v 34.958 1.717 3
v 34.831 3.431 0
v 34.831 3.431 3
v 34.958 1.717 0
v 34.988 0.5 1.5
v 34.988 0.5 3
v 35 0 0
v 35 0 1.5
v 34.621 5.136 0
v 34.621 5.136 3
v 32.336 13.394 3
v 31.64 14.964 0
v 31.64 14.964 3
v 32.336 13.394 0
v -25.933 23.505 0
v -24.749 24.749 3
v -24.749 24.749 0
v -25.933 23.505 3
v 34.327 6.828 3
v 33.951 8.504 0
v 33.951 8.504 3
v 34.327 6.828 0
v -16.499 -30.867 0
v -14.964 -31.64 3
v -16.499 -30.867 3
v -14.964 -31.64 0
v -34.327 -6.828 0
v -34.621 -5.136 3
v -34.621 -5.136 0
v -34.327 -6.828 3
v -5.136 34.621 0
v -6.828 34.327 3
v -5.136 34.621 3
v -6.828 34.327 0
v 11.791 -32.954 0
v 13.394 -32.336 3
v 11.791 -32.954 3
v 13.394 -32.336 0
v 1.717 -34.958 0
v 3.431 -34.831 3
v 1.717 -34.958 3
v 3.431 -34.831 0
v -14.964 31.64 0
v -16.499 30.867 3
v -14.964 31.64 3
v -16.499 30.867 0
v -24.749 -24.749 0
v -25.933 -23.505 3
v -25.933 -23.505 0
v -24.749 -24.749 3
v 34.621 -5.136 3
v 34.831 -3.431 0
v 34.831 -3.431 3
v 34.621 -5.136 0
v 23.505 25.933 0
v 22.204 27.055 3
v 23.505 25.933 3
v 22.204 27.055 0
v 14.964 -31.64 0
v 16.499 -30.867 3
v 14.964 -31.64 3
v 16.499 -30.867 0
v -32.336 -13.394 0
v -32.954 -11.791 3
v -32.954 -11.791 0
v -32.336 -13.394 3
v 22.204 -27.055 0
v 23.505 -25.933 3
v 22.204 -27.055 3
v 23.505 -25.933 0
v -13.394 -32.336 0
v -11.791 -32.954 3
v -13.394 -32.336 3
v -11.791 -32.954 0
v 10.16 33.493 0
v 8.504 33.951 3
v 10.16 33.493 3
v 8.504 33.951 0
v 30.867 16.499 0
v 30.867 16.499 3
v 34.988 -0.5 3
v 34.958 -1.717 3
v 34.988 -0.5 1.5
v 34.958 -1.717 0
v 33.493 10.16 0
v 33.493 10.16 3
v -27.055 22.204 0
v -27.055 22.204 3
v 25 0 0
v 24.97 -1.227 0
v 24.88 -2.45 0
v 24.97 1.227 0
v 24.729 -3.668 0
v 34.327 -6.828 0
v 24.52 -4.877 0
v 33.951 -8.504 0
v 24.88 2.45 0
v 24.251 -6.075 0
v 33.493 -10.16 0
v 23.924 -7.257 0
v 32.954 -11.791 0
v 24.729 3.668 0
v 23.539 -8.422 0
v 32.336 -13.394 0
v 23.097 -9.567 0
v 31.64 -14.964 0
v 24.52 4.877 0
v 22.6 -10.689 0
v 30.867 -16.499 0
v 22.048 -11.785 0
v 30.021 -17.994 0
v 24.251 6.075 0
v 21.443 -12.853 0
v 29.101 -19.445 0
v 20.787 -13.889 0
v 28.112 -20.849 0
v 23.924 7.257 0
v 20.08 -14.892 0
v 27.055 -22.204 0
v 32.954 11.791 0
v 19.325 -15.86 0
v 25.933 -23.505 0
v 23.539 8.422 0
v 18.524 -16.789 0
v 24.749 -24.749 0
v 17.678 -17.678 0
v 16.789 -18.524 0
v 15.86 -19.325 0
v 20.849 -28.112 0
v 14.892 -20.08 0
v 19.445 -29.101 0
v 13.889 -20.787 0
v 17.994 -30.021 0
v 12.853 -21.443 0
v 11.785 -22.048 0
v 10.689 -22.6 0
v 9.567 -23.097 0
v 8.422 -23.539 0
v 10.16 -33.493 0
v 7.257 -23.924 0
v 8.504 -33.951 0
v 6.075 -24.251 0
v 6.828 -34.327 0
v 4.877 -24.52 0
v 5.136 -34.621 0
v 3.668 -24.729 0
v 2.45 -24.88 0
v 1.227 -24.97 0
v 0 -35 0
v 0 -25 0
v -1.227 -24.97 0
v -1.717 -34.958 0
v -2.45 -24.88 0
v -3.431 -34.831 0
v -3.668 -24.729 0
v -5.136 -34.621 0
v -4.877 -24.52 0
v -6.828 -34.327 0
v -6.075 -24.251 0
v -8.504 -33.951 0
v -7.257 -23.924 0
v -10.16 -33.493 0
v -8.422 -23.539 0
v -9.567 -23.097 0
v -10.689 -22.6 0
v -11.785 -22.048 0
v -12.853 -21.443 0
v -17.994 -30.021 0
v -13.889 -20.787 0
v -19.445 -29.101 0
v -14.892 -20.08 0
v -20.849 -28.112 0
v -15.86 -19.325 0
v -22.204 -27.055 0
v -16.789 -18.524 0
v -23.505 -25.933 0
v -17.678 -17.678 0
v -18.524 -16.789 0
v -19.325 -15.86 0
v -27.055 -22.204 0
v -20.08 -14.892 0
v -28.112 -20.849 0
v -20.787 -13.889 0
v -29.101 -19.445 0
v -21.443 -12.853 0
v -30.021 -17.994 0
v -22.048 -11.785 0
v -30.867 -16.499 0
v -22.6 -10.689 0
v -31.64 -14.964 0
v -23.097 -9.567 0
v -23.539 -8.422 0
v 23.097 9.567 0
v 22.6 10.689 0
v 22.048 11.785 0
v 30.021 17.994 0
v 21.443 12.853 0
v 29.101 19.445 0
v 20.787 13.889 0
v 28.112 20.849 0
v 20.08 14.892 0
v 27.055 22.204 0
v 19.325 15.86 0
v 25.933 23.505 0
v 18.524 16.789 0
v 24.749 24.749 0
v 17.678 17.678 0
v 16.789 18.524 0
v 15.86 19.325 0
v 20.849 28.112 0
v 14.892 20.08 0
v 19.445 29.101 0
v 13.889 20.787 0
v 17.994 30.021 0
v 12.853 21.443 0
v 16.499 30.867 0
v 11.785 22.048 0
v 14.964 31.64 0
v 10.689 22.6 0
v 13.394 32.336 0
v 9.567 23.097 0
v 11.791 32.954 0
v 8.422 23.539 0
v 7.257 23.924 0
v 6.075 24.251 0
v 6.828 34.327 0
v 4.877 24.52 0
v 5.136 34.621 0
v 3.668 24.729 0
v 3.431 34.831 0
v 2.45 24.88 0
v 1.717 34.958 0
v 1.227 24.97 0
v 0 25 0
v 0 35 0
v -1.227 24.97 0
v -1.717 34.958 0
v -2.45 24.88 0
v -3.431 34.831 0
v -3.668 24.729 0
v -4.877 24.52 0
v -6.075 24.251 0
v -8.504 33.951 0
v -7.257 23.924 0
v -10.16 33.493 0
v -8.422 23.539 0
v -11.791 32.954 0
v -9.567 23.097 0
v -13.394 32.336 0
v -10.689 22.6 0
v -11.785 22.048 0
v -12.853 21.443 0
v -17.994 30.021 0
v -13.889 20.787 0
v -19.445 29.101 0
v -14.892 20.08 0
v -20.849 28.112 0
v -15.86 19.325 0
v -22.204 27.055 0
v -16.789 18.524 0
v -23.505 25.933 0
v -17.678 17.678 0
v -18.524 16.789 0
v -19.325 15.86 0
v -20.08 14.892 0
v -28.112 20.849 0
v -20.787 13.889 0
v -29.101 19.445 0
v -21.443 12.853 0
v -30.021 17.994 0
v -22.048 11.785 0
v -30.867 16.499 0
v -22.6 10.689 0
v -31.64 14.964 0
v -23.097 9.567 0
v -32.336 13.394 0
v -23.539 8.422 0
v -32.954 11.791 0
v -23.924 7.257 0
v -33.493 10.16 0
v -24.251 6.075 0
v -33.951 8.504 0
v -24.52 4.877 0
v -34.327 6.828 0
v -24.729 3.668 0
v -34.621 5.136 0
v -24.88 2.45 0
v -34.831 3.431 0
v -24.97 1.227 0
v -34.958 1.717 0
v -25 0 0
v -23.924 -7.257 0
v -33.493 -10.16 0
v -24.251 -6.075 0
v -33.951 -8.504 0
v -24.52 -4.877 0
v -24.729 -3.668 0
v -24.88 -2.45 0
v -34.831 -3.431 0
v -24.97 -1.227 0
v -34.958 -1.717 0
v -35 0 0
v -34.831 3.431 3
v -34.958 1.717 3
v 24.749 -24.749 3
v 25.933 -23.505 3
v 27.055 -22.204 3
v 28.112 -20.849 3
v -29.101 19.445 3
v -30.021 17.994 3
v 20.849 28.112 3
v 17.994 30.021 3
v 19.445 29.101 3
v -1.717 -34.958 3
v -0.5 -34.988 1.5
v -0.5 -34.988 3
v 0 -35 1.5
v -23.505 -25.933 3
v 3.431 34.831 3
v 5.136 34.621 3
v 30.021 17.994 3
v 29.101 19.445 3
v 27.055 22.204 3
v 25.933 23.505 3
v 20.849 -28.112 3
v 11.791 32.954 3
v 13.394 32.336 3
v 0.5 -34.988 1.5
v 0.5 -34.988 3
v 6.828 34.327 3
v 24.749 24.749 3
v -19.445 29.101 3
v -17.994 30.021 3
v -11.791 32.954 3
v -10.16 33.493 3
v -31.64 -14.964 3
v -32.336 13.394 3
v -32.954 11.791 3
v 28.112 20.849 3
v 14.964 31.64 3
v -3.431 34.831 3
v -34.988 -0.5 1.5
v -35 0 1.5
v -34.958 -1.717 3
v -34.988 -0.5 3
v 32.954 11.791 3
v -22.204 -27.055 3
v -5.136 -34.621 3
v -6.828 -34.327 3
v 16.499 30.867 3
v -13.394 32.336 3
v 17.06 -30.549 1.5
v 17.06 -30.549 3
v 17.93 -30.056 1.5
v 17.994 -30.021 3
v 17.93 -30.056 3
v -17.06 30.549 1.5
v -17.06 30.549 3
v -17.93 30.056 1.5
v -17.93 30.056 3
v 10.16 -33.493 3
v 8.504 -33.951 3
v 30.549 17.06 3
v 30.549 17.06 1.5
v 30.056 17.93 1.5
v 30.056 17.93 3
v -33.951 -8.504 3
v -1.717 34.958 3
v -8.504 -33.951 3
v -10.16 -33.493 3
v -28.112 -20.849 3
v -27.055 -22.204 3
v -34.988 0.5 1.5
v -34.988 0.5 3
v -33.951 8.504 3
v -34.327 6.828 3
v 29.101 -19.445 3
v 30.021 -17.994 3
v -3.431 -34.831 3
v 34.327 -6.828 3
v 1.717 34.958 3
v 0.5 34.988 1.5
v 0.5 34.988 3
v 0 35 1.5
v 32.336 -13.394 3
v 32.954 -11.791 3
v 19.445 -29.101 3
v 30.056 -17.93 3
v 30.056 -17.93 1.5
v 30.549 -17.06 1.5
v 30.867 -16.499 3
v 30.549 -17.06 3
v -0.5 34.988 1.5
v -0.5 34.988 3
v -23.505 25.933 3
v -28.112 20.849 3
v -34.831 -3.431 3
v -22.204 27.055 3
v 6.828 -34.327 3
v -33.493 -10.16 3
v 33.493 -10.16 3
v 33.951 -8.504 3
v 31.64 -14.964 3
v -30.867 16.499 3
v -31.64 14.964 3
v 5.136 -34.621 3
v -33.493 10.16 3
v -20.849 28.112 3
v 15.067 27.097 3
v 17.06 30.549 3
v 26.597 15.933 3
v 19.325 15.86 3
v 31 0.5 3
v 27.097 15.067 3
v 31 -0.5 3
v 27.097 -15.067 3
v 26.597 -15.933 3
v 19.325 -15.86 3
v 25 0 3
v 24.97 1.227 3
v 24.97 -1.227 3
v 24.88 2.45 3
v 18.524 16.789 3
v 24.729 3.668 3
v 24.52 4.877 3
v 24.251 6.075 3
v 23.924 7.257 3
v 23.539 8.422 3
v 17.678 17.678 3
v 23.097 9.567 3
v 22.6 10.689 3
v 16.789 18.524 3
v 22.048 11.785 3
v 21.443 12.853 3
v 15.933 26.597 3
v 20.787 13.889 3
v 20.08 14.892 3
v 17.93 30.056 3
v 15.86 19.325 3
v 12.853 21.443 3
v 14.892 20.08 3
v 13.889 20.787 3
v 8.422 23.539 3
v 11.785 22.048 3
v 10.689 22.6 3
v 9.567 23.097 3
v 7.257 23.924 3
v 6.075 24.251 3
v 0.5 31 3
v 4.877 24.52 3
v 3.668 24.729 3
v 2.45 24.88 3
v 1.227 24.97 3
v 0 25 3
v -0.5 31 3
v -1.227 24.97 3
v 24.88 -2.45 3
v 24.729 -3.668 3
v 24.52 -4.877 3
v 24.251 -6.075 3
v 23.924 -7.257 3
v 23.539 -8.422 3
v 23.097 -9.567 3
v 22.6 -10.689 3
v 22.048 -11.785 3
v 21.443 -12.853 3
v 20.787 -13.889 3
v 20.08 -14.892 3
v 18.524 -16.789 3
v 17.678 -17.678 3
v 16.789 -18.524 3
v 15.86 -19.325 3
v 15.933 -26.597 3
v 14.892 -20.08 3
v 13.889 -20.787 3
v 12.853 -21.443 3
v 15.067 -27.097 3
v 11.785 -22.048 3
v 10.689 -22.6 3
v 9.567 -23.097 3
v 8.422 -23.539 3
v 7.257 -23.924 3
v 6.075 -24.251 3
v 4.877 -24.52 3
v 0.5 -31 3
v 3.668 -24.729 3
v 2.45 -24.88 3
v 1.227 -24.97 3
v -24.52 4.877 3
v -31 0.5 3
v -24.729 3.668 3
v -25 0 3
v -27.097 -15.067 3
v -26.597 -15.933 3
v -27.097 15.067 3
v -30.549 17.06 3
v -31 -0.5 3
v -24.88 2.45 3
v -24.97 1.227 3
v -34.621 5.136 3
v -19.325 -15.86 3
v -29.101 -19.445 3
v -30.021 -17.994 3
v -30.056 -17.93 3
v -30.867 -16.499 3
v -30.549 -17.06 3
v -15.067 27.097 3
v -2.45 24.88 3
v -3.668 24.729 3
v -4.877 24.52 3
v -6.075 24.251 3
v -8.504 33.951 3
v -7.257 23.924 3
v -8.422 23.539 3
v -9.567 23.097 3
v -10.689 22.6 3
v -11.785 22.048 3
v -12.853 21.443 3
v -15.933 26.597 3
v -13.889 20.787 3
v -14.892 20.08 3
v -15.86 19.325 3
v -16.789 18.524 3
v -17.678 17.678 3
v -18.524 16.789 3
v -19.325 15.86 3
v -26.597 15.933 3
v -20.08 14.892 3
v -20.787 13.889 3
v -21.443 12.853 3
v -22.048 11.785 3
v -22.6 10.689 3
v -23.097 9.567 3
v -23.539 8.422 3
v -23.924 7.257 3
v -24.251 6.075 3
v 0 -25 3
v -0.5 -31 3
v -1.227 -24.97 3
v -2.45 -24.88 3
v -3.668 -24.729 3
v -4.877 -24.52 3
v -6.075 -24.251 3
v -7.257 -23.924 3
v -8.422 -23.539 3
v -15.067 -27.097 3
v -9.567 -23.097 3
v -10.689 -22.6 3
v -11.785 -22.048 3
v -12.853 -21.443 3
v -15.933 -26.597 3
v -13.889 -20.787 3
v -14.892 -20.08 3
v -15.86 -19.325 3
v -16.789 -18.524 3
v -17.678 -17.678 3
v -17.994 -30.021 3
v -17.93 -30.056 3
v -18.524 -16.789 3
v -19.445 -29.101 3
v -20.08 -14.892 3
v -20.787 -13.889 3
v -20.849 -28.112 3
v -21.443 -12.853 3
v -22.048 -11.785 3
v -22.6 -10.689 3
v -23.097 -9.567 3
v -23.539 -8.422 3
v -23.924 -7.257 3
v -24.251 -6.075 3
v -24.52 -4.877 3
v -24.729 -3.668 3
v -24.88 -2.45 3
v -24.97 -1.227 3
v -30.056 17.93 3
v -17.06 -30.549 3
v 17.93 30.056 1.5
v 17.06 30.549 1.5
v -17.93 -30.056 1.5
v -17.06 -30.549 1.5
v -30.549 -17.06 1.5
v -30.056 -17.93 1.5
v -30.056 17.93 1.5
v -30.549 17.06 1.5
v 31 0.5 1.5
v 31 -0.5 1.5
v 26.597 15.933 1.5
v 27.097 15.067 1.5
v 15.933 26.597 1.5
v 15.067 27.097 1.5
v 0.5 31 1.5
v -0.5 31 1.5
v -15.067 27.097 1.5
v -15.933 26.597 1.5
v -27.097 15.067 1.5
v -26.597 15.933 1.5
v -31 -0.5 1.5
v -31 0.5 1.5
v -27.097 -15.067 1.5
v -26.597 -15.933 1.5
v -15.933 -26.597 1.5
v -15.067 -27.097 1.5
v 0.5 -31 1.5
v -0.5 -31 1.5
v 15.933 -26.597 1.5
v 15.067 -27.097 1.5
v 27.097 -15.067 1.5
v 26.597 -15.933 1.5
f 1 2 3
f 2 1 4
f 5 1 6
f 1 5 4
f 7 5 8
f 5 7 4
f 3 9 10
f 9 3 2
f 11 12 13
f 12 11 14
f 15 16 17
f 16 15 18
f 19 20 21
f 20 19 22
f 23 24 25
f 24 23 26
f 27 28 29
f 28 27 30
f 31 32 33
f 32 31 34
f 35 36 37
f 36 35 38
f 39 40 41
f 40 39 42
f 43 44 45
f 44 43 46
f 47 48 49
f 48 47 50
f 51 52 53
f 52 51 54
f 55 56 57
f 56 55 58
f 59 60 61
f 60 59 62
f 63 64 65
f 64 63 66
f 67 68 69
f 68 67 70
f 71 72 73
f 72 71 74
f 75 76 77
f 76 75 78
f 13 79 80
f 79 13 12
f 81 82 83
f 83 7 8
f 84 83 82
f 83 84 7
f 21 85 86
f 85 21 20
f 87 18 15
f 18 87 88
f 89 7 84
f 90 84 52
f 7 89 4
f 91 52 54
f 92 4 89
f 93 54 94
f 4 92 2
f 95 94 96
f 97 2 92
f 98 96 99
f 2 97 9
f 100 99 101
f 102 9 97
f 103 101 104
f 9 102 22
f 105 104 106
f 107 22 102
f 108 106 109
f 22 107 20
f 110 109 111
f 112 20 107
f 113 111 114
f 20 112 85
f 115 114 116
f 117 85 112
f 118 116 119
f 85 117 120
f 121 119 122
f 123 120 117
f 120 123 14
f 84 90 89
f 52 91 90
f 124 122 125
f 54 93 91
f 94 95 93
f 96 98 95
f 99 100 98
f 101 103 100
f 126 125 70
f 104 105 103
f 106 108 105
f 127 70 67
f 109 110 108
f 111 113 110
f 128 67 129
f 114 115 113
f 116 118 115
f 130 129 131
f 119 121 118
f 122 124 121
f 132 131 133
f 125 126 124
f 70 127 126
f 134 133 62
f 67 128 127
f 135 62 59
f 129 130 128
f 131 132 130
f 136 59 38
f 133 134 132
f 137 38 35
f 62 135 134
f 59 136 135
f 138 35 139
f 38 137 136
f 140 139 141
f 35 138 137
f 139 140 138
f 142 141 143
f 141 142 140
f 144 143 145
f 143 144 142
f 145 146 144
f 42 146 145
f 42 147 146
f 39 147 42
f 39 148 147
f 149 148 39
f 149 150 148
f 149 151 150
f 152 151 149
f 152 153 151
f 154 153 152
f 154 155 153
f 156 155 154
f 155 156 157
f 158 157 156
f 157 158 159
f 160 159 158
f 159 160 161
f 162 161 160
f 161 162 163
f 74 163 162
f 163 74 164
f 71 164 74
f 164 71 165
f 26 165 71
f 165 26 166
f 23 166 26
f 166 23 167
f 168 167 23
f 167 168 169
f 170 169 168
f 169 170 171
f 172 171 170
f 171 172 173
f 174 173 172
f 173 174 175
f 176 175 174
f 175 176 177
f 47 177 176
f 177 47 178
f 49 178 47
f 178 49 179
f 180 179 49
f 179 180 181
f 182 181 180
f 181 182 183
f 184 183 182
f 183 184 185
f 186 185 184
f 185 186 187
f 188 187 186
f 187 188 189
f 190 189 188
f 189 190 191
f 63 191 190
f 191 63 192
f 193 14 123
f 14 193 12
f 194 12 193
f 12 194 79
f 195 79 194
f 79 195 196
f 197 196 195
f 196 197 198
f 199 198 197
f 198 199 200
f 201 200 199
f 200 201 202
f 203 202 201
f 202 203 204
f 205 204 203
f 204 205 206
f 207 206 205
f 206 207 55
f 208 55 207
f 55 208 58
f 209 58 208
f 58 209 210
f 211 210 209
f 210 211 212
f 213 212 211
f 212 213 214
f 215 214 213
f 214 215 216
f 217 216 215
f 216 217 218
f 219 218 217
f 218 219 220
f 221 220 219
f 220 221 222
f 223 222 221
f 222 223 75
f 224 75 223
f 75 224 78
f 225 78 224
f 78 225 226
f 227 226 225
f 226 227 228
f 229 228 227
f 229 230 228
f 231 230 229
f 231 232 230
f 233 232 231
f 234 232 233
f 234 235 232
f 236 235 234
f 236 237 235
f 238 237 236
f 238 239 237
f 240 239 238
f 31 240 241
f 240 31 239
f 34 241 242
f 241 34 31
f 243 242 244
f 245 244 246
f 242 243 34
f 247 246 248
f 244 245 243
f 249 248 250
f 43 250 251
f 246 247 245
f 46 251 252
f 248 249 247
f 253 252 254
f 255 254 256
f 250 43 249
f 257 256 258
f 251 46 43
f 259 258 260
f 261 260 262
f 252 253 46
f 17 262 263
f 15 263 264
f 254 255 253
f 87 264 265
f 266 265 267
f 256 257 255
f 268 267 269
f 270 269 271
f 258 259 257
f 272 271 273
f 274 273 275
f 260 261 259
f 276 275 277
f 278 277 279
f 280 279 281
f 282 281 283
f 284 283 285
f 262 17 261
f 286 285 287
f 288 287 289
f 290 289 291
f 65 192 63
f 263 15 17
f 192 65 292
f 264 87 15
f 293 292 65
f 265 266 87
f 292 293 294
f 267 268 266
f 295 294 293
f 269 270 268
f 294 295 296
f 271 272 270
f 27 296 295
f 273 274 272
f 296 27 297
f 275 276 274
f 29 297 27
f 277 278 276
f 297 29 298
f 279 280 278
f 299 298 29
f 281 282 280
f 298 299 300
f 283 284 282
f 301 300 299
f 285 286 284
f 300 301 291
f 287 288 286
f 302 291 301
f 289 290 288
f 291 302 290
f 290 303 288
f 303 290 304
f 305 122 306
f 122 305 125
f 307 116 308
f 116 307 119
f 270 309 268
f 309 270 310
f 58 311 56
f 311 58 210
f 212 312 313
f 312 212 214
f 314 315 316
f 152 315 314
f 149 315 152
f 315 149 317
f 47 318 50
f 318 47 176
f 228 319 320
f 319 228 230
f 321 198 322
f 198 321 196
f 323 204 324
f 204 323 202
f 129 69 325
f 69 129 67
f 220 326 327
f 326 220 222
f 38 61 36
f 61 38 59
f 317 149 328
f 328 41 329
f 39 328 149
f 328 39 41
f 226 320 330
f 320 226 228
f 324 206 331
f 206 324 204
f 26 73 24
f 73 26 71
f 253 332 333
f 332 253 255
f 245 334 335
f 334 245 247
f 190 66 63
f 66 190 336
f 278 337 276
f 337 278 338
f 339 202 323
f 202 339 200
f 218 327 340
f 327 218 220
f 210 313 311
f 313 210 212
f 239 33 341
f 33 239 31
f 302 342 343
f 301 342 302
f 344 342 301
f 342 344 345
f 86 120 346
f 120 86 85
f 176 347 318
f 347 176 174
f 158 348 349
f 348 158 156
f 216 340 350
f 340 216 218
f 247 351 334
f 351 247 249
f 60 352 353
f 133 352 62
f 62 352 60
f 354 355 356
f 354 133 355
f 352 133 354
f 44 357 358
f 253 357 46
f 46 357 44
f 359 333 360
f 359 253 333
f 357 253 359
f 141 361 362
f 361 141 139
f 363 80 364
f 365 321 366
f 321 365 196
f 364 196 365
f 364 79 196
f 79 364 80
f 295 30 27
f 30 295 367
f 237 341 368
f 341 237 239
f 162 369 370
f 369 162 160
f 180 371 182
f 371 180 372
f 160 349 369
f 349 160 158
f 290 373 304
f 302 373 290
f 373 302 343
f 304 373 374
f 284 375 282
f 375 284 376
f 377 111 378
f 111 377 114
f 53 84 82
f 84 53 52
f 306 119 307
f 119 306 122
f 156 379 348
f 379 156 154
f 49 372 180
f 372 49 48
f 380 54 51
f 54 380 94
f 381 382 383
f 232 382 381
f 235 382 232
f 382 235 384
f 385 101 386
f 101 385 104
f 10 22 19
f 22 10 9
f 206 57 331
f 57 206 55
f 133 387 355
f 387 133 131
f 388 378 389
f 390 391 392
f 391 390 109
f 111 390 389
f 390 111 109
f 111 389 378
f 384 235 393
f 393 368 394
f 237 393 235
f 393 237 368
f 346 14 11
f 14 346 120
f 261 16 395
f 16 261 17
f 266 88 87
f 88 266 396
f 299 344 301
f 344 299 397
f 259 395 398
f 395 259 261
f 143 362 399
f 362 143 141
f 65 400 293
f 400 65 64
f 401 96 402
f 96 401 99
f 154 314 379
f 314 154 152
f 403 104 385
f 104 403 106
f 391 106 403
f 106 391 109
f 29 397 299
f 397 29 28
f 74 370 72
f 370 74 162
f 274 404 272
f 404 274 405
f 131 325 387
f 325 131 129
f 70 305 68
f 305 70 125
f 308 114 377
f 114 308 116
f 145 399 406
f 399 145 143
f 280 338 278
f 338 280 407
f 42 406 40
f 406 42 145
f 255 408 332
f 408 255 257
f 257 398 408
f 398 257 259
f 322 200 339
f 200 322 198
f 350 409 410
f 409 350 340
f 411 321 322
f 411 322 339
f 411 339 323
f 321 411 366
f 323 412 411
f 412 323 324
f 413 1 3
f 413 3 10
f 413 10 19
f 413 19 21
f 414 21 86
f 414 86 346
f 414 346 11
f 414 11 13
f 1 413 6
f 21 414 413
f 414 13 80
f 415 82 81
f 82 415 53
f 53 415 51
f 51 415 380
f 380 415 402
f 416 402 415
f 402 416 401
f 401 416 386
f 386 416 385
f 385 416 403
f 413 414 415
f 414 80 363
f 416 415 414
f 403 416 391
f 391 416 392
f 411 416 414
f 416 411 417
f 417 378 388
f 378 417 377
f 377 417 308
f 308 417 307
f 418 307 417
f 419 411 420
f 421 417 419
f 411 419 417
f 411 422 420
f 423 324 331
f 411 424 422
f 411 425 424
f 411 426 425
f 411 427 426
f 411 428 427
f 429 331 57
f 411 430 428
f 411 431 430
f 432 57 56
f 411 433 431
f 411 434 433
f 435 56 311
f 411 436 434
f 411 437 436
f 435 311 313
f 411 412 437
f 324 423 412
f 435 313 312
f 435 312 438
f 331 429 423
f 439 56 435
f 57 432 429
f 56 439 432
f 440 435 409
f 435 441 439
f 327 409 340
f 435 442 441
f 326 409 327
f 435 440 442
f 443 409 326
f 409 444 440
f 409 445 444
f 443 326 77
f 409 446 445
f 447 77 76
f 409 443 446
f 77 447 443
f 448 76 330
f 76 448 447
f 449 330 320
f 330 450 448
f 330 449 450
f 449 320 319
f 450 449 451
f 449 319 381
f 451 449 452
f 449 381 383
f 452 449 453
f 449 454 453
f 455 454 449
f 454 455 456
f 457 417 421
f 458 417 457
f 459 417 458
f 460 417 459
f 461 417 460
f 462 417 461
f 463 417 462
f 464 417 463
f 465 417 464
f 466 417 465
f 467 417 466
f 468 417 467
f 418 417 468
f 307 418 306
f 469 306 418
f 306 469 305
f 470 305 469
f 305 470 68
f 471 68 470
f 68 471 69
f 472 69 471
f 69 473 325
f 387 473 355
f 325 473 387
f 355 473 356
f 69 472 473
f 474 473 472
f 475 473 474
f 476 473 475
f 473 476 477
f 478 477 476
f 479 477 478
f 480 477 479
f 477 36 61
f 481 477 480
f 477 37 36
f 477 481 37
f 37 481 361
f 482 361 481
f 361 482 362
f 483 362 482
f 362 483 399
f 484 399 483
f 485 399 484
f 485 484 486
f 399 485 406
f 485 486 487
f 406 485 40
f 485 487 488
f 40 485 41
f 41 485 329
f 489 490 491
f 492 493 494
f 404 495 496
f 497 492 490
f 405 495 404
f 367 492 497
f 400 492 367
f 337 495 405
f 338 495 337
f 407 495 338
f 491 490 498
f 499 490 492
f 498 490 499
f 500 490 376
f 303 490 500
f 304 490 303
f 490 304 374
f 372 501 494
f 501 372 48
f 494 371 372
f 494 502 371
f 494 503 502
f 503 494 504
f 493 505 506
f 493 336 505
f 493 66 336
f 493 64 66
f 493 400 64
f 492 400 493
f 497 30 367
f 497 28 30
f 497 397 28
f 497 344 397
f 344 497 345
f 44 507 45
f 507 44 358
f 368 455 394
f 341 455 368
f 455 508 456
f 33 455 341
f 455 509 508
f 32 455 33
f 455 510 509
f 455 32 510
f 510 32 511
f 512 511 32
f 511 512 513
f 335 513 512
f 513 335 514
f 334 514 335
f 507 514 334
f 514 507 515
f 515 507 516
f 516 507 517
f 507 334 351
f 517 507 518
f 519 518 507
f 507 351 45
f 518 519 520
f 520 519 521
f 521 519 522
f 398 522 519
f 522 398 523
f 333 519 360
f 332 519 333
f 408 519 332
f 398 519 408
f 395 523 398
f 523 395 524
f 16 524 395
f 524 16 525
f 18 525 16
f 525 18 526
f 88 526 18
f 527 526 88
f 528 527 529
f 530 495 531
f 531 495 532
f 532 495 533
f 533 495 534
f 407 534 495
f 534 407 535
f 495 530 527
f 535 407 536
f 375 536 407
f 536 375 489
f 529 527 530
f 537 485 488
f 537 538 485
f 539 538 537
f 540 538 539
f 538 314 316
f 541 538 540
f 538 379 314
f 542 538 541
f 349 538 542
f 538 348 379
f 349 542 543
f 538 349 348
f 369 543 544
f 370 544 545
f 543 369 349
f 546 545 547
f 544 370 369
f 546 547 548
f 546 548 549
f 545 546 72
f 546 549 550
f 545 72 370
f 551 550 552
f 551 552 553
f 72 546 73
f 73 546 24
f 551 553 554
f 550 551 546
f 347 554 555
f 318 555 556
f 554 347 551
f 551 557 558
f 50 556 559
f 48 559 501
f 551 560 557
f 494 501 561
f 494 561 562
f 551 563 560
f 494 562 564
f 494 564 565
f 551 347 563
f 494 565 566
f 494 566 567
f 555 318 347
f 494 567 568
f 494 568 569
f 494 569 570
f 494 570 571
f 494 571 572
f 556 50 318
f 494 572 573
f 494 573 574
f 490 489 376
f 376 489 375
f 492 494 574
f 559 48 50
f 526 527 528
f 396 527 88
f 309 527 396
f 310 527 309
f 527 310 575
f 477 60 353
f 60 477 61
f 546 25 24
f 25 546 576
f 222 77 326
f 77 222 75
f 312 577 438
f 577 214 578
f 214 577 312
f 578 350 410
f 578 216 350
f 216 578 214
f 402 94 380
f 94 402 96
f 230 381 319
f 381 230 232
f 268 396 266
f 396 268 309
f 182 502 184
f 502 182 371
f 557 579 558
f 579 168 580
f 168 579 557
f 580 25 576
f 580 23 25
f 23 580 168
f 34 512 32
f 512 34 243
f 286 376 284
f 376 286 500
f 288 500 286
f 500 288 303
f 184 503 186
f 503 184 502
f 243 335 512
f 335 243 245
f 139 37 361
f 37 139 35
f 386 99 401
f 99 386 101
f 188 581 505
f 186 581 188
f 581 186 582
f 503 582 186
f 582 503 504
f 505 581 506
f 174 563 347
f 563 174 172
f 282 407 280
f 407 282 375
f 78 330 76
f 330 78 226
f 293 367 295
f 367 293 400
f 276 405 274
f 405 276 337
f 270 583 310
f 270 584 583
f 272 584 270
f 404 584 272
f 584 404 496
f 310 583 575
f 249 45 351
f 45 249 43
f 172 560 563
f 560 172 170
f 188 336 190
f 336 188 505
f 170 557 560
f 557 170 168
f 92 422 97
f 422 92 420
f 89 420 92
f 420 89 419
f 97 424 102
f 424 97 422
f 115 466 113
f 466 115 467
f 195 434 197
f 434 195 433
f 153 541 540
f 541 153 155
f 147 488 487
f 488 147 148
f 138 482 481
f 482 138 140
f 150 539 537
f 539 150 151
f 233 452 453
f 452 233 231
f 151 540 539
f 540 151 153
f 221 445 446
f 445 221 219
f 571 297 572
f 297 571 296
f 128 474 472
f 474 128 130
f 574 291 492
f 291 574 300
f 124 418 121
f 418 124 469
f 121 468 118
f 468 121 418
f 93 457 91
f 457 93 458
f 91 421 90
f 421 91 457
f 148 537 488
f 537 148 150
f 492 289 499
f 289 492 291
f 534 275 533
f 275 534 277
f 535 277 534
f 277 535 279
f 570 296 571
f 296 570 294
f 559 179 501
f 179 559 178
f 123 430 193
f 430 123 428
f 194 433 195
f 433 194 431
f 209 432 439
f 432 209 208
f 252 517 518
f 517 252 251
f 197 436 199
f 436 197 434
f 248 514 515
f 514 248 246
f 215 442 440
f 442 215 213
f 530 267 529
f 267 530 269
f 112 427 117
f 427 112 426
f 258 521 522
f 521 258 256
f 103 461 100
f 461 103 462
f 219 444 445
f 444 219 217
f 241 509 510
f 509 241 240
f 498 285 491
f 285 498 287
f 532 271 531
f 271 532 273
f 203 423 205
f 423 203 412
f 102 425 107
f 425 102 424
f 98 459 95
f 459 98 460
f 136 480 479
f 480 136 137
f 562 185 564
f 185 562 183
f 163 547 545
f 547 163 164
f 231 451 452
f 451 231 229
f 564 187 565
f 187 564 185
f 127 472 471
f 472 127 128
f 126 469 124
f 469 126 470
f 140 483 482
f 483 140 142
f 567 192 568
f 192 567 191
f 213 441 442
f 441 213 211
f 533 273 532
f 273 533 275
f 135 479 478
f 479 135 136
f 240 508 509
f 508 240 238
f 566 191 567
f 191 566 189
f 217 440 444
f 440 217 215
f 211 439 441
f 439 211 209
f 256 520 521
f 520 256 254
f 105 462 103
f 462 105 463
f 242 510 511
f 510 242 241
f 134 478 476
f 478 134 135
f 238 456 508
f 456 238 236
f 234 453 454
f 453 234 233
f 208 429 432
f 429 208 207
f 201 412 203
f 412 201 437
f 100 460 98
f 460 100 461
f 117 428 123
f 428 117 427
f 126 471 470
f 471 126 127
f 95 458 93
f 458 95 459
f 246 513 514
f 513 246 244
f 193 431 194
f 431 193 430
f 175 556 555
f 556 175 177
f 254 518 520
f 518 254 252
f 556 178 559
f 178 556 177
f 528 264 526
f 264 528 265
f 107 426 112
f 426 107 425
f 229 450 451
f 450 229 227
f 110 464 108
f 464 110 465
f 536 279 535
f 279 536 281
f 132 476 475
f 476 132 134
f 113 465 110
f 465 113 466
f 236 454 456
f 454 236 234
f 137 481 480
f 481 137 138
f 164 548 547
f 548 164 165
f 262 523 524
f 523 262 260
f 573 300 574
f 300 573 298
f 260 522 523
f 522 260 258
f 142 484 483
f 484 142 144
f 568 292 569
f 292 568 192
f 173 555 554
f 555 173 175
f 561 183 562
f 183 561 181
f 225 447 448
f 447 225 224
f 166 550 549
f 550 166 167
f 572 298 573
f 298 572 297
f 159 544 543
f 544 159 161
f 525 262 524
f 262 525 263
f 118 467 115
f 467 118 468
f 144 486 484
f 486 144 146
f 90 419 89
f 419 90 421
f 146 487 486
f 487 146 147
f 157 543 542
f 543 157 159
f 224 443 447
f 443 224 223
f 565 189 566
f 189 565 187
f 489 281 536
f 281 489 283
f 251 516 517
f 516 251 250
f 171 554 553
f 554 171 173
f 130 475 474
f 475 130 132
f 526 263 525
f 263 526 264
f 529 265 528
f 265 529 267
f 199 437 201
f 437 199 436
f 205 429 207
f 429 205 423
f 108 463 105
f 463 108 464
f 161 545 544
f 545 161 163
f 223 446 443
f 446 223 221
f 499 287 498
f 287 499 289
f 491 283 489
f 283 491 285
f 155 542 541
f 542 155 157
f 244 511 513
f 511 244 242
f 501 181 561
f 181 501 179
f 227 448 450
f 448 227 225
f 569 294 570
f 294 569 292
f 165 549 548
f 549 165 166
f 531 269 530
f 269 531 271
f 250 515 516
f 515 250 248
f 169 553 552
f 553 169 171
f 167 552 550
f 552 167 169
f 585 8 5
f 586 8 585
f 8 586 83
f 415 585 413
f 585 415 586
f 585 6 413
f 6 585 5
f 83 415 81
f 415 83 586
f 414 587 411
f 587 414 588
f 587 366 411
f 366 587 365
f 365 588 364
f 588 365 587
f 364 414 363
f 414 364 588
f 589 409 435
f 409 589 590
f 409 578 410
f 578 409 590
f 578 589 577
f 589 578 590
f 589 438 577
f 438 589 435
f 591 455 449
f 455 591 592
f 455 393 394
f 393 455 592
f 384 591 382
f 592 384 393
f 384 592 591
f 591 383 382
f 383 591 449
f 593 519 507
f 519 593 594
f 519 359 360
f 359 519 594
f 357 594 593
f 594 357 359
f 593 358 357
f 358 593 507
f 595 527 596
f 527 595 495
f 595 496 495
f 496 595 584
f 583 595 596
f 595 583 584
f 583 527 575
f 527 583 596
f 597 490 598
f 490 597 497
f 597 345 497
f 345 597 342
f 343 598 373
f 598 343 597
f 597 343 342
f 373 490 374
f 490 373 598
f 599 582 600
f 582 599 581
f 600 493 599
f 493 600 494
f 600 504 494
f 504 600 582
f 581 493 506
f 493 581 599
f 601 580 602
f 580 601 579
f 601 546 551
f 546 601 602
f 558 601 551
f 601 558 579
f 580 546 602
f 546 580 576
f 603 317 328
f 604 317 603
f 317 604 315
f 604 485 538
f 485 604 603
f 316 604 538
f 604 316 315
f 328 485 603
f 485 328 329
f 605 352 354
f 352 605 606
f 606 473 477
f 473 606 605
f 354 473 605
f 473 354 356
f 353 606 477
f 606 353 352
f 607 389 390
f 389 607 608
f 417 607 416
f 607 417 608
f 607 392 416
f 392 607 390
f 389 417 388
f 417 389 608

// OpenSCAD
// Flat dial ring with radial tick marks for a rotary stage
// Units: mm. Print orientation: flat on bed, top face up.

$fn = 128;

// --- Ring dimensions ---
outer_d      = 70;    // outer diameter
inner_d      = 50;    // inner diameter
ring_h       = 3;     // ring thickness

// --- Tick marks ---
tick_count   = 12;    // number of evenly spaced ticks
tick_width   = 1;     // groove width
tick_depth   = 1.5;   // groove depth from top face
tick_length  = 4;     // radial length inward from outer edge
tick_start   = 0;     // angle of first tick (deg, +X axis)

// --- Clearance for clean booleans ---
eps          = 0.5;   // overshoot past cut faces

outer_r = outer_d / 2;
inner_r = inner_d / 2;

difference() {
    // Annulus
    difference() {
        cylinder(h = ring_h, r = outer_r);
        translate([0, 0, -eps])
            cylinder(h = ring_h + 2 * eps, r = inner_r);
    }

    // Radial tick grooves
    for (i = [0 : tick_count - 1]) {
        rotate([0, 0, tick_start + i * 360 / tick_count])
            translate([outer_r - tick_length,
                       -tick_width / 2,
                       ring_h - tick_depth])
                cube([tick_length + eps,
                      tick_width,
                      tick_depth + eps]);
    }
}
